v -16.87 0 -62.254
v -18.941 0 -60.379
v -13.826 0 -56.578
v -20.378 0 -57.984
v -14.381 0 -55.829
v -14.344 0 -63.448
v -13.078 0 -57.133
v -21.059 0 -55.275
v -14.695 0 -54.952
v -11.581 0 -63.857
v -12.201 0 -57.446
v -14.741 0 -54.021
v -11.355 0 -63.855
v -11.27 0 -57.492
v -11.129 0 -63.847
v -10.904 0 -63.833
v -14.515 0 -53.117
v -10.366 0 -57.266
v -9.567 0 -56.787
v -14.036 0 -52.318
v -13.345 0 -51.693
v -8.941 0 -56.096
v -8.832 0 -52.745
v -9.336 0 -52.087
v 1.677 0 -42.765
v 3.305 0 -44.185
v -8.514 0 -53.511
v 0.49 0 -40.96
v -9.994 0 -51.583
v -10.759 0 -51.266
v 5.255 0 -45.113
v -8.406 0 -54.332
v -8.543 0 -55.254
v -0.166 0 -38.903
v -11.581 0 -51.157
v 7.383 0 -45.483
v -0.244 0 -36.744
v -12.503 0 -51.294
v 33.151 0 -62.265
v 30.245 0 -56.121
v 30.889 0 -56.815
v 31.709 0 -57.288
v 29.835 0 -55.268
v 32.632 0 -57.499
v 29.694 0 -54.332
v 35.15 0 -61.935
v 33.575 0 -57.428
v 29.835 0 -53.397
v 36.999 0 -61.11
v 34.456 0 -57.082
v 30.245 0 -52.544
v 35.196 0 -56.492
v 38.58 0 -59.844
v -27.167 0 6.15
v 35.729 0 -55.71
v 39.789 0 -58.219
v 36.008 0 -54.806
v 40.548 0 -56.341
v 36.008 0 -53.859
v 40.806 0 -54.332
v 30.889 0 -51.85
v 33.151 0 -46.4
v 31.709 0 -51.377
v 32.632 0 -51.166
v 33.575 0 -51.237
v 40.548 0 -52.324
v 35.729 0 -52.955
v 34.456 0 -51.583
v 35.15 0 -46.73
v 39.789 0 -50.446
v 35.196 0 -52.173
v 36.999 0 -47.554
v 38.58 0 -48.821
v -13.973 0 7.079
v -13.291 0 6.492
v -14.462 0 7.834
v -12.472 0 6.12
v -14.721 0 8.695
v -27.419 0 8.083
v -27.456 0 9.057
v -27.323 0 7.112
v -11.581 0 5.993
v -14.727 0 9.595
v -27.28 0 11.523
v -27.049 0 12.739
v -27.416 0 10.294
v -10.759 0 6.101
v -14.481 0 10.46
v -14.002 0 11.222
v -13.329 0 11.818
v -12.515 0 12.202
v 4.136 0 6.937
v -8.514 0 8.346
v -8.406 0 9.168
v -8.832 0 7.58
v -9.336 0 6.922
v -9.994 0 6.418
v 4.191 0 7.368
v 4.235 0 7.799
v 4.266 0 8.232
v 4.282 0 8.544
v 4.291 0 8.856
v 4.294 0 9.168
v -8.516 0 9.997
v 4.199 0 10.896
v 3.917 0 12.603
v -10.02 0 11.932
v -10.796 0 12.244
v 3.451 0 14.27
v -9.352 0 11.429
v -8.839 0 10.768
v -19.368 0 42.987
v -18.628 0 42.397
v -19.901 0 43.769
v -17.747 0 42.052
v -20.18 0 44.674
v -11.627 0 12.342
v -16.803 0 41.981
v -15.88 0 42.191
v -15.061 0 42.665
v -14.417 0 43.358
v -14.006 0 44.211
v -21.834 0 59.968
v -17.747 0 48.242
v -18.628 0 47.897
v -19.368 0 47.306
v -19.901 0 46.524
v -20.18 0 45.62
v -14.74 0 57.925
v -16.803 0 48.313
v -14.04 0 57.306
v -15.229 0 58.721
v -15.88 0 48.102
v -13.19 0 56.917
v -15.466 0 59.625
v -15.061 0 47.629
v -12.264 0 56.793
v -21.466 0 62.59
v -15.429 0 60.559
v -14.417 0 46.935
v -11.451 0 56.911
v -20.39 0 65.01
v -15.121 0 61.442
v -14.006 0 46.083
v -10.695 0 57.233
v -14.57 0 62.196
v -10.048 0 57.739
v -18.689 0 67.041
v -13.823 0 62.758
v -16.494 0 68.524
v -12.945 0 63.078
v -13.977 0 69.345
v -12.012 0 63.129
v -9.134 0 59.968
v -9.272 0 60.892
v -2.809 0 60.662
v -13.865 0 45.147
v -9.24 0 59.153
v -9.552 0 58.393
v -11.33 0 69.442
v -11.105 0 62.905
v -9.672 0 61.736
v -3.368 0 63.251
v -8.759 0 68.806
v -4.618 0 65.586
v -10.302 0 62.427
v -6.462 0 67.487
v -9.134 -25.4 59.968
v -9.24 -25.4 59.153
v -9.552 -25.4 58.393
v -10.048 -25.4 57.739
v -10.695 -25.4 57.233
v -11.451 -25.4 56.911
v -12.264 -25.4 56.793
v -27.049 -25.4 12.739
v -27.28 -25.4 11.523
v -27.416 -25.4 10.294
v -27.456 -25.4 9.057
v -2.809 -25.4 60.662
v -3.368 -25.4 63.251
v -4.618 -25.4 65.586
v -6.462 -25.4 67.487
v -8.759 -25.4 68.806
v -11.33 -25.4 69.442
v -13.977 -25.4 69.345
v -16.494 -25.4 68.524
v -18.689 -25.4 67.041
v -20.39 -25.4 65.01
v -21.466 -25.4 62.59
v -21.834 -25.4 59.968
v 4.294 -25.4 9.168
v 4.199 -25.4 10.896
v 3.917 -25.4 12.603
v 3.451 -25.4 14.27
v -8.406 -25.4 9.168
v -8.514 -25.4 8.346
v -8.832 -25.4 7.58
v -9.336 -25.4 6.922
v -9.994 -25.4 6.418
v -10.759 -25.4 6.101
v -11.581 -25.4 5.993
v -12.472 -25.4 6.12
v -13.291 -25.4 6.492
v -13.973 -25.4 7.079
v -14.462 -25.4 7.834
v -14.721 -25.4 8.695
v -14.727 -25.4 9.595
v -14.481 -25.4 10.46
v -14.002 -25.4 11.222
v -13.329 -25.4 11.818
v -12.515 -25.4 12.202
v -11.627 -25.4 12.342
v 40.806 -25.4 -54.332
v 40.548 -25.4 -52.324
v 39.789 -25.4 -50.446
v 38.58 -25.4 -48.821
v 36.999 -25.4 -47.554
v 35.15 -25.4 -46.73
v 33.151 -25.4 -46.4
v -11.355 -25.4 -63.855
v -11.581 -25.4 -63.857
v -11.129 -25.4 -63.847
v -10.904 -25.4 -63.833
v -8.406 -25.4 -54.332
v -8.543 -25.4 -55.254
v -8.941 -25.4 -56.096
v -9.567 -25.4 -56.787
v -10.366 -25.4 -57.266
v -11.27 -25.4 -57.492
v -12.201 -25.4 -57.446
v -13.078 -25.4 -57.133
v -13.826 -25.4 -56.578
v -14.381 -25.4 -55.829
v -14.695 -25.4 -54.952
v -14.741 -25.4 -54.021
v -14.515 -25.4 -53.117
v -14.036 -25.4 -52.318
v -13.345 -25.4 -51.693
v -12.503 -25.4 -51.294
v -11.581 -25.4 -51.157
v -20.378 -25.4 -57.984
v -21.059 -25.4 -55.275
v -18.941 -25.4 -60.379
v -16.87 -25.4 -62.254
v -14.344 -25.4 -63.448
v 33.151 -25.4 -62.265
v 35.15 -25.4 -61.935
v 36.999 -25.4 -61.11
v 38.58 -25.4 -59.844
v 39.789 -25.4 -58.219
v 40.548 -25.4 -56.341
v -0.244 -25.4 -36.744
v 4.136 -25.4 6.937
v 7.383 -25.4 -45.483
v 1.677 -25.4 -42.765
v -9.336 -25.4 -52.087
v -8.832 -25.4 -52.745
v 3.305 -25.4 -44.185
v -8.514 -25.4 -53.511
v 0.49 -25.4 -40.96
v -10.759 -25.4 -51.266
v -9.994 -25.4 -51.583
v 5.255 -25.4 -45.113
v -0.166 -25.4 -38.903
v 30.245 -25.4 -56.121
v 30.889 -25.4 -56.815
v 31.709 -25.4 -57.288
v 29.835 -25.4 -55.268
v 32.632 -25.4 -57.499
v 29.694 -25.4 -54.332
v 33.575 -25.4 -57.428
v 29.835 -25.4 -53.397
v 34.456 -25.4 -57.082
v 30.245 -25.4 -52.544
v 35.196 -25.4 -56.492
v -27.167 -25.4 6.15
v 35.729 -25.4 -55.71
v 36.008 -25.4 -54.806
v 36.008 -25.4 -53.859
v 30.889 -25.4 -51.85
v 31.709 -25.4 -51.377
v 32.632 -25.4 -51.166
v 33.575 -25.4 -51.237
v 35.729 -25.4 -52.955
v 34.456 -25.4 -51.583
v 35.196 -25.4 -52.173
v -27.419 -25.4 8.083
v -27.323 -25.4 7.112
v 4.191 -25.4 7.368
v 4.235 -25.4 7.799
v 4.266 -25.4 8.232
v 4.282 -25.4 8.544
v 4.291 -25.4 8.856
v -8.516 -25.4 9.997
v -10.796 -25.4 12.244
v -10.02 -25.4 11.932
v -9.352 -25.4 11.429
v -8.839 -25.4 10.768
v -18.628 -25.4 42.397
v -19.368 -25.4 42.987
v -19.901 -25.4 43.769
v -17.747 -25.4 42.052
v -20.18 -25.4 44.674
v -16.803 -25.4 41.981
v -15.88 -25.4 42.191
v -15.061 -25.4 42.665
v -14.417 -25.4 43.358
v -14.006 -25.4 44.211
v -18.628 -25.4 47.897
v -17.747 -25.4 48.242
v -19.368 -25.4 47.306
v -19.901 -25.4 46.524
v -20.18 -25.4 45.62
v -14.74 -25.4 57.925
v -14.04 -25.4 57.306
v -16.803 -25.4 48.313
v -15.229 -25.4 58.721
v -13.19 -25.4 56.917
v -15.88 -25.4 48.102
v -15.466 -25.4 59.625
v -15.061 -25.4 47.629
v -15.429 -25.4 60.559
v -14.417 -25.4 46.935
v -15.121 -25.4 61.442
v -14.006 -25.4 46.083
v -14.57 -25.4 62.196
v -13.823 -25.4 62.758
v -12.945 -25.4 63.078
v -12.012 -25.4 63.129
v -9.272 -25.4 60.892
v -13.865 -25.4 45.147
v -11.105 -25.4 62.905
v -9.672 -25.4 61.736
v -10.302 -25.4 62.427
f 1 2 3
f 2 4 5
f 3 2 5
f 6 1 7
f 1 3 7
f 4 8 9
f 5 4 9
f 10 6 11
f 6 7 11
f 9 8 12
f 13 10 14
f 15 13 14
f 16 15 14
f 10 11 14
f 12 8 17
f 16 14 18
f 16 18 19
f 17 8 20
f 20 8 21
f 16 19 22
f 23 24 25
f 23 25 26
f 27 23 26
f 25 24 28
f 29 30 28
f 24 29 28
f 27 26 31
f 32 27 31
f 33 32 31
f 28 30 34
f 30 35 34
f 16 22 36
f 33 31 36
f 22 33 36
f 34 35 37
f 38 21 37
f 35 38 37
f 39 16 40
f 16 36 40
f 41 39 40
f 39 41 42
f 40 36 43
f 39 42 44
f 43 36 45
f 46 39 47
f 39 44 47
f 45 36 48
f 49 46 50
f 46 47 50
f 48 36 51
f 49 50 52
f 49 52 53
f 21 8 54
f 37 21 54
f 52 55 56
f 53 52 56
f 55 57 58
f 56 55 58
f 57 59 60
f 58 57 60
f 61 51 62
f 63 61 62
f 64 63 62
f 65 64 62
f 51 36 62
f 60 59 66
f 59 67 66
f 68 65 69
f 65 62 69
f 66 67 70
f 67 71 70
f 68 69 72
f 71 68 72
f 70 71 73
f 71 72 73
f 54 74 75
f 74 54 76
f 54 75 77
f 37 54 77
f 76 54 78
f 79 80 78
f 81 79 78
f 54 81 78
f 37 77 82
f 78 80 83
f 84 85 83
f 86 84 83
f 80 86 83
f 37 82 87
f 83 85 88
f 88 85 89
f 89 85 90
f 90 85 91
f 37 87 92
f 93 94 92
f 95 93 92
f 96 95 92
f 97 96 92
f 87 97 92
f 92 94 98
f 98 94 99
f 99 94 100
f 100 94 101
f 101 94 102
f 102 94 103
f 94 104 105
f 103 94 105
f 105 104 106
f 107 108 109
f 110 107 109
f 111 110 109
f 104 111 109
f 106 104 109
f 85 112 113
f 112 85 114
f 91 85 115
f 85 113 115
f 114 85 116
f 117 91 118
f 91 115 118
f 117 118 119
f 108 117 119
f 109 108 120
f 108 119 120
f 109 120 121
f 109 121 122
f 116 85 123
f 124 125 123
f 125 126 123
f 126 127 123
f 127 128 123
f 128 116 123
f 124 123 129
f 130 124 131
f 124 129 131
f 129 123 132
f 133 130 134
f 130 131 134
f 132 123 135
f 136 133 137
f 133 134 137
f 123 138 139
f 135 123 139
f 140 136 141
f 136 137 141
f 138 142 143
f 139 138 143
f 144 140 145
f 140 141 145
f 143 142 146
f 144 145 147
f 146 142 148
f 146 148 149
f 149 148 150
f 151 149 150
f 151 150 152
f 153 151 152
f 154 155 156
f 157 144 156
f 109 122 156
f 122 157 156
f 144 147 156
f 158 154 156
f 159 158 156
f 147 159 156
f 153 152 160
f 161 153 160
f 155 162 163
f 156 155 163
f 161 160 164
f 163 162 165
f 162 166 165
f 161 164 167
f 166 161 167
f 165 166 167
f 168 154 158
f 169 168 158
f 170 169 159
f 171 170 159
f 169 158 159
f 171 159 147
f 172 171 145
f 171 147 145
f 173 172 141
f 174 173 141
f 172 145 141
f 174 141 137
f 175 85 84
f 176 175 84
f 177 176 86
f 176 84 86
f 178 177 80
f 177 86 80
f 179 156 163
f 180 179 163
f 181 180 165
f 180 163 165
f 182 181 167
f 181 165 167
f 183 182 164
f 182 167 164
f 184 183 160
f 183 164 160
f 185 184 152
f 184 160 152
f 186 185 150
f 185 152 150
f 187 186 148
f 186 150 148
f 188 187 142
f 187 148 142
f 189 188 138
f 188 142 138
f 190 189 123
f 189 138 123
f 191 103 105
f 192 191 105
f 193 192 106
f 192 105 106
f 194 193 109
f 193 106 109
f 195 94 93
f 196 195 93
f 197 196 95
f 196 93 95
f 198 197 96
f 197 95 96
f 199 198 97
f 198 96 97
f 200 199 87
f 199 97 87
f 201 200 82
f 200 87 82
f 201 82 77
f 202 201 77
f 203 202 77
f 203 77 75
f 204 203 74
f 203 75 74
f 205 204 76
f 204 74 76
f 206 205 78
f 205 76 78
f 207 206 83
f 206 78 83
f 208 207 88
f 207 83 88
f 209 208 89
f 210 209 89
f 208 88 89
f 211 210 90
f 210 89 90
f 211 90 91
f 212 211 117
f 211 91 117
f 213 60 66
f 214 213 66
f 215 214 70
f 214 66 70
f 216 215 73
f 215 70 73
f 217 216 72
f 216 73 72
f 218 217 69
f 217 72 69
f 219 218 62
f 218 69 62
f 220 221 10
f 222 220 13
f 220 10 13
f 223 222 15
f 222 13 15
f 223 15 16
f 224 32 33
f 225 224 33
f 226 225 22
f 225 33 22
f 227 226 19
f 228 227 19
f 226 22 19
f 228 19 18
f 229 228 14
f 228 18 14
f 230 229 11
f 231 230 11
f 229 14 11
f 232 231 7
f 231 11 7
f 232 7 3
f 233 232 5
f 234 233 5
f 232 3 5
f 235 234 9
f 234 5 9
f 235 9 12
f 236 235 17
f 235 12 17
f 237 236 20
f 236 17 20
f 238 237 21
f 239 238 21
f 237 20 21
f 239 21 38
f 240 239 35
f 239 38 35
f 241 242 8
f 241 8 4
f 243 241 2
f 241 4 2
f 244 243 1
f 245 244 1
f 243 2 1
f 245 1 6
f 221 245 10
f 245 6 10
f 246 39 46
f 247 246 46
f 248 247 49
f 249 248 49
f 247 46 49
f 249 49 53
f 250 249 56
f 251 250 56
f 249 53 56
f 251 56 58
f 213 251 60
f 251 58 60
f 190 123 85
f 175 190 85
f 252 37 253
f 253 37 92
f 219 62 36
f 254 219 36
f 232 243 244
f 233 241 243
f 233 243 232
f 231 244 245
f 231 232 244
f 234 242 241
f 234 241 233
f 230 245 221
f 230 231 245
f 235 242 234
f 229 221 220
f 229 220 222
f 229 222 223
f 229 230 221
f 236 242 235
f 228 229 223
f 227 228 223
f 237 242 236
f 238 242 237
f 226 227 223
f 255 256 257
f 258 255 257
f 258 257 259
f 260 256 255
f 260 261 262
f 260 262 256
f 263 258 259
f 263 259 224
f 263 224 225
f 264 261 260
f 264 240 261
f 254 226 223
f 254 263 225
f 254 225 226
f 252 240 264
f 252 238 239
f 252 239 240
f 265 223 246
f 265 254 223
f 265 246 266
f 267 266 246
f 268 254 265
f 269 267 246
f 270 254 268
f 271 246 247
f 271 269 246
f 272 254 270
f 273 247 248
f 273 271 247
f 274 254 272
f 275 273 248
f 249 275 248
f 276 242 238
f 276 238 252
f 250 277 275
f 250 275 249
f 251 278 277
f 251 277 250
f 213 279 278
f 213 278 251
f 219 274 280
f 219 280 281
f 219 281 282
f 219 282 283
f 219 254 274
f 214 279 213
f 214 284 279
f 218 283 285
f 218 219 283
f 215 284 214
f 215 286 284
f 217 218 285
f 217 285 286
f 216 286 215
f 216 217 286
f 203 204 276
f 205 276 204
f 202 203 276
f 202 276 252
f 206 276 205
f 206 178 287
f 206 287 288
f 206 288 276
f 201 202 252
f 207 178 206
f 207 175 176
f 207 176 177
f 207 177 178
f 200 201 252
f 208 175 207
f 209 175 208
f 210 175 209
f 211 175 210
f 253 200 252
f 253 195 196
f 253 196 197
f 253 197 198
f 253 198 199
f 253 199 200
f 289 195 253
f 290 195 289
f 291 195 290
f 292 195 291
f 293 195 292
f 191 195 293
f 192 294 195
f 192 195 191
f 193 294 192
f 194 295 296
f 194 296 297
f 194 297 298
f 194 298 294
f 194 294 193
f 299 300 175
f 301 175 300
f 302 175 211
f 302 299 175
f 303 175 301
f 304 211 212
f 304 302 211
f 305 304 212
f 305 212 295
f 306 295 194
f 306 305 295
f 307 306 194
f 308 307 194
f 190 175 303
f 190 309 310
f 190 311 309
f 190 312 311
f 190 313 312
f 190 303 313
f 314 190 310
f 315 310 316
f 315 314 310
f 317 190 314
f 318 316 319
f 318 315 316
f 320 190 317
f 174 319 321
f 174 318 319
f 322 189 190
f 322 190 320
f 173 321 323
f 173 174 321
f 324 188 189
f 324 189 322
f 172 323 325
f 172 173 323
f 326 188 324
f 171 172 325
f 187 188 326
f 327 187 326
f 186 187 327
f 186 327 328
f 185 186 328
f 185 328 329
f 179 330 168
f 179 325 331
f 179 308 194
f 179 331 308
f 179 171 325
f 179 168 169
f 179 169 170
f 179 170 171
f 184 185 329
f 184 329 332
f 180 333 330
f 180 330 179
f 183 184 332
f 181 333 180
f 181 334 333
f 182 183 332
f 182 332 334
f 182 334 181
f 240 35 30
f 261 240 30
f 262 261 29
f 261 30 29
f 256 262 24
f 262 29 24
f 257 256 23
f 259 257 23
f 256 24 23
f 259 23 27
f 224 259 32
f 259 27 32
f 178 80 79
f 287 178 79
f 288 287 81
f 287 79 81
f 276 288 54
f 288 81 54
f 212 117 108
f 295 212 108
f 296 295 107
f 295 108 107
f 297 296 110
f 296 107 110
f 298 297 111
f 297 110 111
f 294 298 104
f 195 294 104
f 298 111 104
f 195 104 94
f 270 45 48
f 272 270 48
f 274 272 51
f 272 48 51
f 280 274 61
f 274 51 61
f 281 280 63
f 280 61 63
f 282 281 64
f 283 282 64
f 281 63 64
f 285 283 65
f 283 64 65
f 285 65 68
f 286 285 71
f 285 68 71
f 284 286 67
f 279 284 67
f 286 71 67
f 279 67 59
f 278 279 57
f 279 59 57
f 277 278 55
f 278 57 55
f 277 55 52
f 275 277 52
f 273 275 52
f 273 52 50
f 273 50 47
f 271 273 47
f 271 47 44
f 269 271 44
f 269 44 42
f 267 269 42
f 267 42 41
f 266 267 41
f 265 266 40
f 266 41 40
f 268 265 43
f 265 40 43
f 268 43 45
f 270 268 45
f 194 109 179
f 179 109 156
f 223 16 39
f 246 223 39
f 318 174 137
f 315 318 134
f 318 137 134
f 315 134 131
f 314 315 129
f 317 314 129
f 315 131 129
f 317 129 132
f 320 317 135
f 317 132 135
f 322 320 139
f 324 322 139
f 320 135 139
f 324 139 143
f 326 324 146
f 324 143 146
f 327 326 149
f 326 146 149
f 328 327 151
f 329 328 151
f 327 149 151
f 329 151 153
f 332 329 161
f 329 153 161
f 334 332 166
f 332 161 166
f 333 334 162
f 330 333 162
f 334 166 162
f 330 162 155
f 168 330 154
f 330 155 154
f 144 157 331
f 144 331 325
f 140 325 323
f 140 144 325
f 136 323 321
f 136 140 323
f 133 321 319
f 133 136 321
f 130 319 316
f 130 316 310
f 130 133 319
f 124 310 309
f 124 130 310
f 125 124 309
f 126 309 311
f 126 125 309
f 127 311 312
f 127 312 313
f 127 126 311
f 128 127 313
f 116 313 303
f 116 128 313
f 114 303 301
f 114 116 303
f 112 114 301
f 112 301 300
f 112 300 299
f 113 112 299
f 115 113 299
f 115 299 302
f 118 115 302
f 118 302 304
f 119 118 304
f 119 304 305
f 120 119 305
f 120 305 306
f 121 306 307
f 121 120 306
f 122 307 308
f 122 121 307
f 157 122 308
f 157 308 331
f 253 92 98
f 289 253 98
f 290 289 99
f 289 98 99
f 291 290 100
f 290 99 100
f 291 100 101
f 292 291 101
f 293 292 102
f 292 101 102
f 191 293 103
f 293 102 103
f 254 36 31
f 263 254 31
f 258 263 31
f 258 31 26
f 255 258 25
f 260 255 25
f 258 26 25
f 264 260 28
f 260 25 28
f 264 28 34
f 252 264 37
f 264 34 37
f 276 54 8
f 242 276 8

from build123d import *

# Parameters (mm, degrees)
F0_R     = 3.175
F1_DEPTH = 25.4
F2_DEPTH = 25.4


with BuildPart() as f1:
    # F0 (on Front) → F1 (new body)
    with BuildSketch(Plane.XZ):
        with BuildLine():
            ThreePointArc((-21.8341132764, 59.9675301176), (-18.9958831699, 53.1842614814), (-12.1726469476, 50.4435077562))
            ThreePointArc((-12.1726469476, 50.4435077562), (-5.5258446402, 53.2807602241), (-2.7841132764, 59.9675301176))
            ThreePointArc((-2.7841132764, 59.9675301176), (-2.7904513825, 60.3149502538), (-2.8094572661, 60.6619080307))
            ThreePointArc((-2.8094572661, 60.6619080307), (-12.6565334125, 69.4861920114), (-21.8341132764, 59.9675301176))
        make_face()
        with BuildLine():
            ThreePointArc((-9.1341132764, 59.9675301176), (-10.048023731, 57.7386068198), (-12.2636245001, 56.7928559971))
            ThreePointArc((-12.2636245001, 56.7928559971), (-14.5702028218, 62.1964534155), (-9.1341132764, 59.9675301176))
        make_face(mode=Mode.SUBTRACT)
        with BuildLine():
            ThreePointArc((-2.7841132764, 59.9675301176), (-5.5258446402, 53.2807602241), (-12.1726469476, 50.4435077562))
            Line((-12.1726469476, 50.4435077562), (-11.8086620269, 25.04090072))
            ThreePointArc((-11.8086620269, 25.04090072), (-2.4270394488, 22.1373657907), (3.4513160797, 14.2703273667))
            Line((3.4513160797, 14.2703273667), (-2.8094572661, 60.6619080307))
            ThreePointArc((-2.8094572661, 60.6619080307), (-2.7904513825, 60.3149502538), (-2.7841132764, 59.9675301176))
        make_face()
        with BuildLine():
            Line((-11.8086620269, 25.04090072), (-12.1726469476, 50.4435077562))
            ThreePointArc((-12.1726469476, 50.4435077562), (-18.9958831699, 53.1842614814), (-21.8341132764, 59.9675301176))
            Line((-21.8341132764, 59.9675301176), (-27.0492958066, 12.7388321873))
            ThreePointArc((-27.0492958066, 12.7388321873), (-21.5523049303, 21.5203861976), (-11.8086620269, 25.04090072))
        make_face()
        with Locations((-17.0401986688, 45.1469011605)):
            Circle(F0_R, mode=Mode.SUBTRACT)
        with BuildLine():
            ThreePointArc((3.4513160797, 14.2703273667), (-2.4270394488, 22.1373657907), (-11.8086620269, 25.04090072))
            Line((-11.8086620269, 25.04090072), (-11.6267069219, 12.3422042381))
            ThreePointArc((-11.6267069219, 12.3422042381), (-9.3522948478, 11.428619663), (-8.4062181456, 9.1675301176))
            ThreePointArc((-8.4062181456, 9.1675301176), (-9.3361541153, 6.9224660873), (-11.5812181456, 5.9925301176))
            Line((-11.5812181456, 5.9925301176), (-11.5812181456, -6.7074698824))
            ThreePointArc((-11.5812181456, -6.7074698824), (-1.1742480118, -2.8204053858), (4.1363360906, 6.9372579749))
            Line((4.1363360906, 6.9372579749), (4.2661999847, 8.232135226))
            Line((4.2661999847, 8.232135226), (3.4513160797, 14.2703273667))
        make_face()
        with BuildLine():
            Line((-11.6267069219, 12.3422042381), (-11.8086620269, 25.04090072))
            ThreePointArc((-11.8086620269, 25.04090072), (-21.5523049303, 21.5203861976), (-27.0492958066, 12.7388321873))
            Line((-27.0492958066, 12.7388321873), (-27.4558348468, 9.0572142544))
            Line((-27.4558348468, 9.0572142544), (-27.1667644493, 6.1498536246))
            ThreePointArc((-27.1667644493, 6.1498536246), (-21.6834458869, -3.0783107953), (-11.5812181456, -6.7074698824))
            Line((-11.5812181456, -6.7074698824), (-11.5812181456, 5.9925301176))
            ThreePointArc((-11.5812181456, 5.9925301176), (-14.7561366747, 9.1447851458), (-11.6267069219, 12.3422042381))
        make_face()
        with BuildLine():
            ThreePointArc((4.2937818544, 9.1675301176), (4.0817494185, 11.7534674886), (3.4513160797, 14.2703273667))
            Line((3.4513160797, 14.2703273667), (4.2661999847, 8.232135226))
            ThreePointArc((4.2661999847, 8.232135226), (4.2868848888, 8.6996293902), (4.2937818544, 9.1675301176))
        make_face()
        with BuildLine():
            Line((-27.4558348468, 9.0572142544), (-27.0492958066, 12.7388321873))
            ThreePointArc((-27.0492958066, 12.7388321873), (-27.3603087443, 10.9099206818), (-27.4558348468, 9.0572142544))
        make_face()
        with BuildLine():
            ThreePointArc((4.1363360906, 6.9372579749), (4.2145422634, 7.5833653216), (4.2661999847, 8.232135226))
            Line((4.2661999847, 8.232135226), (4.1363360906, 6.9372579749))
        make_face()
        with BuildLine():
            Line((-27.1667644493, 6.1498536246), (-27.4558348468, 9.0572142544))
            ThreePointArc((-27.4558348468, 9.0572142544), (-27.3783270751, 7.5968695977), (-27.1667644493, 6.1498536246))
        make_face()
        with BuildLine():
            ThreePointArc((4.1363360906, 6.9372579749), (-1.1742480118, -2.8204053858), (-11.5812181456, -6.7074698824))
            Line((-11.5812181456, -6.7074698824), (-11.5812181456, -44.8074698824))
            ThreePointArc((-11.5812181456, -44.8074698824), (-4.8460260548, -47.5972777916), (-2.0562181456, -54.3324698824))
            Line((-2.0562181456, -54.3324698824), (24.9312818544, -54.3324698824))
            ThreePointArc((24.9312818544, -54.3324698824), (27.3568713697, -48.6208370985), (33.1511871289, -46.3999952678))
            Line((33.1511871289, -46.3999952678), (7.3831695342, -45.4826240265))
            ThreePointArc((7.3831695342, -45.4826240265), (1.67659756, -42.7654990677), (-0.2444901556, -36.7441077228))
            Line((-0.2444901556, -36.7441077228), (4.1363360906, 6.9372579749))
        make_face()
        with BuildLine():
            Line((-11.5812181456, -44.8074698824), (-11.5812181456, -6.7074698824))
            ThreePointArc((-11.5812181456, -6.7074698824), (-21.6834458869, -3.0783107953), (-27.1667644493, 6.1498536246))
            Line((-27.1667644493, 6.1498536246), (-21.0594835033, -55.2748661943))
            ThreePointArc((-21.0594835033, -55.2748661943), (-18.6417404305, -47.9391413233), (-11.5812181456, -44.8074698824))
        make_face()
        with BuildLine():
            Line((-11.5812181456, -51.1574698824), (-11.5812181456, -44.8074698824))
            ThreePointArc((-11.5812181456, -44.8074698824), (-18.6417404305, -47.9391413233), (-21.0594835033, -55.2748661943))
            ThreePointArc((-21.0594835033, -55.2748661943), (-17.9745467047, -61.3929921673), (-11.5812181456, -63.8574698824))
            Line((-11.5812181456, -63.8574698824), (-10.9038745977, -63.8333556684))
            ThreePointArc((-10.9038745977, -63.8333556684), (-4.6106614141, -60.8237689706), (-2.0562181456, -54.3324698824))
            Line((-2.0562181456, -54.3324698824), (-8.4062181456, -54.3324698824))
            ThreePointArc((-8.4062181456, -54.3324698824), (-13.8262821759, -56.5775339127), (-11.5812181456, -51.1574698824))
        make_face()
        with BuildLine():
            Line((24.9312818544, -54.3324698824), (-2.0562181456, -54.3324698824))
            ThreePointArc((-2.0562181456, -54.3324698824), (-4.6106614141, -60.8237689706), (-10.9038745977, -63.8333556684))
            Line((-10.9038745977, -63.8333556684), (33.1511871289, -62.264944497))
            ThreePointArc((33.1511871289, -62.264944497), (27.3568713697, -60.0441026663), (24.9312818544, -54.3324698824))
        make_face()
        with BuildLine():
            Line((-10.9038745977, -63.8333556684), (-11.5812181456, -63.8574698824))
            ThreePointArc((-11.5812181456, -63.8574698824), (-11.2423318161, -63.8514394199), (-10.9038745977, -63.8333556684))
        make_face()
        with BuildLine():
            ThreePointArc((33.1511871289, -46.3999952678), (27.3568713697, -48.6208370985), (24.9312818544, -54.3324698824))
            ThreePointArc((24.9312818544, -54.3324698824), (27.3568713697, -60.0441026663), (33.1511871289, -62.264944497))
            ThreePointArc((33.1511871289, -62.264944497), (38.5804146383, -59.8443803671), (40.8062818544, -54.3324698824))
            ThreePointArc((40.8062818544, -54.3324698824), (38.5804146383, -48.8205593977), (33.1511871289, -46.3999952678))
        make_face()
        with BuildLine():
            ThreePointArc((36.0437818544, -54.3324698824), (32.8687818544, -57.5074698824), (29.6937818544, -54.3324698824))
            ThreePointArc((29.6937818544, -54.3324698824), (32.8687818544, -51.1574698824), (36.0437818544, -54.3324698824))
        make_face(mode=Mode.SUBTRACT)
    extrude(amount=F1_DEPTH)

    # F0 (on Front) → F2 (join)
    with BuildSketch(Plane.XZ):
        with BuildLine():
            ThreePointArc((-2.0562181456, -54.3324698824), (-4.8460260548, -47.5972777916), (-11.5812181456, -44.8074698824))
            Line((-11.5812181456, -44.8074698824), (-11.5812181456, -51.1574698824))
            ThreePointArc((-11.5812181456, -51.1574698824), (-9.3361541153, -52.0874058521), (-8.4062181456, -54.3324698824))
            Line((-8.4062181456, -54.3324698824), (-2.0562181456, -54.3324698824))
        make_face()
    extrude(amount=F2_DEPTH)


solid = f1.part
